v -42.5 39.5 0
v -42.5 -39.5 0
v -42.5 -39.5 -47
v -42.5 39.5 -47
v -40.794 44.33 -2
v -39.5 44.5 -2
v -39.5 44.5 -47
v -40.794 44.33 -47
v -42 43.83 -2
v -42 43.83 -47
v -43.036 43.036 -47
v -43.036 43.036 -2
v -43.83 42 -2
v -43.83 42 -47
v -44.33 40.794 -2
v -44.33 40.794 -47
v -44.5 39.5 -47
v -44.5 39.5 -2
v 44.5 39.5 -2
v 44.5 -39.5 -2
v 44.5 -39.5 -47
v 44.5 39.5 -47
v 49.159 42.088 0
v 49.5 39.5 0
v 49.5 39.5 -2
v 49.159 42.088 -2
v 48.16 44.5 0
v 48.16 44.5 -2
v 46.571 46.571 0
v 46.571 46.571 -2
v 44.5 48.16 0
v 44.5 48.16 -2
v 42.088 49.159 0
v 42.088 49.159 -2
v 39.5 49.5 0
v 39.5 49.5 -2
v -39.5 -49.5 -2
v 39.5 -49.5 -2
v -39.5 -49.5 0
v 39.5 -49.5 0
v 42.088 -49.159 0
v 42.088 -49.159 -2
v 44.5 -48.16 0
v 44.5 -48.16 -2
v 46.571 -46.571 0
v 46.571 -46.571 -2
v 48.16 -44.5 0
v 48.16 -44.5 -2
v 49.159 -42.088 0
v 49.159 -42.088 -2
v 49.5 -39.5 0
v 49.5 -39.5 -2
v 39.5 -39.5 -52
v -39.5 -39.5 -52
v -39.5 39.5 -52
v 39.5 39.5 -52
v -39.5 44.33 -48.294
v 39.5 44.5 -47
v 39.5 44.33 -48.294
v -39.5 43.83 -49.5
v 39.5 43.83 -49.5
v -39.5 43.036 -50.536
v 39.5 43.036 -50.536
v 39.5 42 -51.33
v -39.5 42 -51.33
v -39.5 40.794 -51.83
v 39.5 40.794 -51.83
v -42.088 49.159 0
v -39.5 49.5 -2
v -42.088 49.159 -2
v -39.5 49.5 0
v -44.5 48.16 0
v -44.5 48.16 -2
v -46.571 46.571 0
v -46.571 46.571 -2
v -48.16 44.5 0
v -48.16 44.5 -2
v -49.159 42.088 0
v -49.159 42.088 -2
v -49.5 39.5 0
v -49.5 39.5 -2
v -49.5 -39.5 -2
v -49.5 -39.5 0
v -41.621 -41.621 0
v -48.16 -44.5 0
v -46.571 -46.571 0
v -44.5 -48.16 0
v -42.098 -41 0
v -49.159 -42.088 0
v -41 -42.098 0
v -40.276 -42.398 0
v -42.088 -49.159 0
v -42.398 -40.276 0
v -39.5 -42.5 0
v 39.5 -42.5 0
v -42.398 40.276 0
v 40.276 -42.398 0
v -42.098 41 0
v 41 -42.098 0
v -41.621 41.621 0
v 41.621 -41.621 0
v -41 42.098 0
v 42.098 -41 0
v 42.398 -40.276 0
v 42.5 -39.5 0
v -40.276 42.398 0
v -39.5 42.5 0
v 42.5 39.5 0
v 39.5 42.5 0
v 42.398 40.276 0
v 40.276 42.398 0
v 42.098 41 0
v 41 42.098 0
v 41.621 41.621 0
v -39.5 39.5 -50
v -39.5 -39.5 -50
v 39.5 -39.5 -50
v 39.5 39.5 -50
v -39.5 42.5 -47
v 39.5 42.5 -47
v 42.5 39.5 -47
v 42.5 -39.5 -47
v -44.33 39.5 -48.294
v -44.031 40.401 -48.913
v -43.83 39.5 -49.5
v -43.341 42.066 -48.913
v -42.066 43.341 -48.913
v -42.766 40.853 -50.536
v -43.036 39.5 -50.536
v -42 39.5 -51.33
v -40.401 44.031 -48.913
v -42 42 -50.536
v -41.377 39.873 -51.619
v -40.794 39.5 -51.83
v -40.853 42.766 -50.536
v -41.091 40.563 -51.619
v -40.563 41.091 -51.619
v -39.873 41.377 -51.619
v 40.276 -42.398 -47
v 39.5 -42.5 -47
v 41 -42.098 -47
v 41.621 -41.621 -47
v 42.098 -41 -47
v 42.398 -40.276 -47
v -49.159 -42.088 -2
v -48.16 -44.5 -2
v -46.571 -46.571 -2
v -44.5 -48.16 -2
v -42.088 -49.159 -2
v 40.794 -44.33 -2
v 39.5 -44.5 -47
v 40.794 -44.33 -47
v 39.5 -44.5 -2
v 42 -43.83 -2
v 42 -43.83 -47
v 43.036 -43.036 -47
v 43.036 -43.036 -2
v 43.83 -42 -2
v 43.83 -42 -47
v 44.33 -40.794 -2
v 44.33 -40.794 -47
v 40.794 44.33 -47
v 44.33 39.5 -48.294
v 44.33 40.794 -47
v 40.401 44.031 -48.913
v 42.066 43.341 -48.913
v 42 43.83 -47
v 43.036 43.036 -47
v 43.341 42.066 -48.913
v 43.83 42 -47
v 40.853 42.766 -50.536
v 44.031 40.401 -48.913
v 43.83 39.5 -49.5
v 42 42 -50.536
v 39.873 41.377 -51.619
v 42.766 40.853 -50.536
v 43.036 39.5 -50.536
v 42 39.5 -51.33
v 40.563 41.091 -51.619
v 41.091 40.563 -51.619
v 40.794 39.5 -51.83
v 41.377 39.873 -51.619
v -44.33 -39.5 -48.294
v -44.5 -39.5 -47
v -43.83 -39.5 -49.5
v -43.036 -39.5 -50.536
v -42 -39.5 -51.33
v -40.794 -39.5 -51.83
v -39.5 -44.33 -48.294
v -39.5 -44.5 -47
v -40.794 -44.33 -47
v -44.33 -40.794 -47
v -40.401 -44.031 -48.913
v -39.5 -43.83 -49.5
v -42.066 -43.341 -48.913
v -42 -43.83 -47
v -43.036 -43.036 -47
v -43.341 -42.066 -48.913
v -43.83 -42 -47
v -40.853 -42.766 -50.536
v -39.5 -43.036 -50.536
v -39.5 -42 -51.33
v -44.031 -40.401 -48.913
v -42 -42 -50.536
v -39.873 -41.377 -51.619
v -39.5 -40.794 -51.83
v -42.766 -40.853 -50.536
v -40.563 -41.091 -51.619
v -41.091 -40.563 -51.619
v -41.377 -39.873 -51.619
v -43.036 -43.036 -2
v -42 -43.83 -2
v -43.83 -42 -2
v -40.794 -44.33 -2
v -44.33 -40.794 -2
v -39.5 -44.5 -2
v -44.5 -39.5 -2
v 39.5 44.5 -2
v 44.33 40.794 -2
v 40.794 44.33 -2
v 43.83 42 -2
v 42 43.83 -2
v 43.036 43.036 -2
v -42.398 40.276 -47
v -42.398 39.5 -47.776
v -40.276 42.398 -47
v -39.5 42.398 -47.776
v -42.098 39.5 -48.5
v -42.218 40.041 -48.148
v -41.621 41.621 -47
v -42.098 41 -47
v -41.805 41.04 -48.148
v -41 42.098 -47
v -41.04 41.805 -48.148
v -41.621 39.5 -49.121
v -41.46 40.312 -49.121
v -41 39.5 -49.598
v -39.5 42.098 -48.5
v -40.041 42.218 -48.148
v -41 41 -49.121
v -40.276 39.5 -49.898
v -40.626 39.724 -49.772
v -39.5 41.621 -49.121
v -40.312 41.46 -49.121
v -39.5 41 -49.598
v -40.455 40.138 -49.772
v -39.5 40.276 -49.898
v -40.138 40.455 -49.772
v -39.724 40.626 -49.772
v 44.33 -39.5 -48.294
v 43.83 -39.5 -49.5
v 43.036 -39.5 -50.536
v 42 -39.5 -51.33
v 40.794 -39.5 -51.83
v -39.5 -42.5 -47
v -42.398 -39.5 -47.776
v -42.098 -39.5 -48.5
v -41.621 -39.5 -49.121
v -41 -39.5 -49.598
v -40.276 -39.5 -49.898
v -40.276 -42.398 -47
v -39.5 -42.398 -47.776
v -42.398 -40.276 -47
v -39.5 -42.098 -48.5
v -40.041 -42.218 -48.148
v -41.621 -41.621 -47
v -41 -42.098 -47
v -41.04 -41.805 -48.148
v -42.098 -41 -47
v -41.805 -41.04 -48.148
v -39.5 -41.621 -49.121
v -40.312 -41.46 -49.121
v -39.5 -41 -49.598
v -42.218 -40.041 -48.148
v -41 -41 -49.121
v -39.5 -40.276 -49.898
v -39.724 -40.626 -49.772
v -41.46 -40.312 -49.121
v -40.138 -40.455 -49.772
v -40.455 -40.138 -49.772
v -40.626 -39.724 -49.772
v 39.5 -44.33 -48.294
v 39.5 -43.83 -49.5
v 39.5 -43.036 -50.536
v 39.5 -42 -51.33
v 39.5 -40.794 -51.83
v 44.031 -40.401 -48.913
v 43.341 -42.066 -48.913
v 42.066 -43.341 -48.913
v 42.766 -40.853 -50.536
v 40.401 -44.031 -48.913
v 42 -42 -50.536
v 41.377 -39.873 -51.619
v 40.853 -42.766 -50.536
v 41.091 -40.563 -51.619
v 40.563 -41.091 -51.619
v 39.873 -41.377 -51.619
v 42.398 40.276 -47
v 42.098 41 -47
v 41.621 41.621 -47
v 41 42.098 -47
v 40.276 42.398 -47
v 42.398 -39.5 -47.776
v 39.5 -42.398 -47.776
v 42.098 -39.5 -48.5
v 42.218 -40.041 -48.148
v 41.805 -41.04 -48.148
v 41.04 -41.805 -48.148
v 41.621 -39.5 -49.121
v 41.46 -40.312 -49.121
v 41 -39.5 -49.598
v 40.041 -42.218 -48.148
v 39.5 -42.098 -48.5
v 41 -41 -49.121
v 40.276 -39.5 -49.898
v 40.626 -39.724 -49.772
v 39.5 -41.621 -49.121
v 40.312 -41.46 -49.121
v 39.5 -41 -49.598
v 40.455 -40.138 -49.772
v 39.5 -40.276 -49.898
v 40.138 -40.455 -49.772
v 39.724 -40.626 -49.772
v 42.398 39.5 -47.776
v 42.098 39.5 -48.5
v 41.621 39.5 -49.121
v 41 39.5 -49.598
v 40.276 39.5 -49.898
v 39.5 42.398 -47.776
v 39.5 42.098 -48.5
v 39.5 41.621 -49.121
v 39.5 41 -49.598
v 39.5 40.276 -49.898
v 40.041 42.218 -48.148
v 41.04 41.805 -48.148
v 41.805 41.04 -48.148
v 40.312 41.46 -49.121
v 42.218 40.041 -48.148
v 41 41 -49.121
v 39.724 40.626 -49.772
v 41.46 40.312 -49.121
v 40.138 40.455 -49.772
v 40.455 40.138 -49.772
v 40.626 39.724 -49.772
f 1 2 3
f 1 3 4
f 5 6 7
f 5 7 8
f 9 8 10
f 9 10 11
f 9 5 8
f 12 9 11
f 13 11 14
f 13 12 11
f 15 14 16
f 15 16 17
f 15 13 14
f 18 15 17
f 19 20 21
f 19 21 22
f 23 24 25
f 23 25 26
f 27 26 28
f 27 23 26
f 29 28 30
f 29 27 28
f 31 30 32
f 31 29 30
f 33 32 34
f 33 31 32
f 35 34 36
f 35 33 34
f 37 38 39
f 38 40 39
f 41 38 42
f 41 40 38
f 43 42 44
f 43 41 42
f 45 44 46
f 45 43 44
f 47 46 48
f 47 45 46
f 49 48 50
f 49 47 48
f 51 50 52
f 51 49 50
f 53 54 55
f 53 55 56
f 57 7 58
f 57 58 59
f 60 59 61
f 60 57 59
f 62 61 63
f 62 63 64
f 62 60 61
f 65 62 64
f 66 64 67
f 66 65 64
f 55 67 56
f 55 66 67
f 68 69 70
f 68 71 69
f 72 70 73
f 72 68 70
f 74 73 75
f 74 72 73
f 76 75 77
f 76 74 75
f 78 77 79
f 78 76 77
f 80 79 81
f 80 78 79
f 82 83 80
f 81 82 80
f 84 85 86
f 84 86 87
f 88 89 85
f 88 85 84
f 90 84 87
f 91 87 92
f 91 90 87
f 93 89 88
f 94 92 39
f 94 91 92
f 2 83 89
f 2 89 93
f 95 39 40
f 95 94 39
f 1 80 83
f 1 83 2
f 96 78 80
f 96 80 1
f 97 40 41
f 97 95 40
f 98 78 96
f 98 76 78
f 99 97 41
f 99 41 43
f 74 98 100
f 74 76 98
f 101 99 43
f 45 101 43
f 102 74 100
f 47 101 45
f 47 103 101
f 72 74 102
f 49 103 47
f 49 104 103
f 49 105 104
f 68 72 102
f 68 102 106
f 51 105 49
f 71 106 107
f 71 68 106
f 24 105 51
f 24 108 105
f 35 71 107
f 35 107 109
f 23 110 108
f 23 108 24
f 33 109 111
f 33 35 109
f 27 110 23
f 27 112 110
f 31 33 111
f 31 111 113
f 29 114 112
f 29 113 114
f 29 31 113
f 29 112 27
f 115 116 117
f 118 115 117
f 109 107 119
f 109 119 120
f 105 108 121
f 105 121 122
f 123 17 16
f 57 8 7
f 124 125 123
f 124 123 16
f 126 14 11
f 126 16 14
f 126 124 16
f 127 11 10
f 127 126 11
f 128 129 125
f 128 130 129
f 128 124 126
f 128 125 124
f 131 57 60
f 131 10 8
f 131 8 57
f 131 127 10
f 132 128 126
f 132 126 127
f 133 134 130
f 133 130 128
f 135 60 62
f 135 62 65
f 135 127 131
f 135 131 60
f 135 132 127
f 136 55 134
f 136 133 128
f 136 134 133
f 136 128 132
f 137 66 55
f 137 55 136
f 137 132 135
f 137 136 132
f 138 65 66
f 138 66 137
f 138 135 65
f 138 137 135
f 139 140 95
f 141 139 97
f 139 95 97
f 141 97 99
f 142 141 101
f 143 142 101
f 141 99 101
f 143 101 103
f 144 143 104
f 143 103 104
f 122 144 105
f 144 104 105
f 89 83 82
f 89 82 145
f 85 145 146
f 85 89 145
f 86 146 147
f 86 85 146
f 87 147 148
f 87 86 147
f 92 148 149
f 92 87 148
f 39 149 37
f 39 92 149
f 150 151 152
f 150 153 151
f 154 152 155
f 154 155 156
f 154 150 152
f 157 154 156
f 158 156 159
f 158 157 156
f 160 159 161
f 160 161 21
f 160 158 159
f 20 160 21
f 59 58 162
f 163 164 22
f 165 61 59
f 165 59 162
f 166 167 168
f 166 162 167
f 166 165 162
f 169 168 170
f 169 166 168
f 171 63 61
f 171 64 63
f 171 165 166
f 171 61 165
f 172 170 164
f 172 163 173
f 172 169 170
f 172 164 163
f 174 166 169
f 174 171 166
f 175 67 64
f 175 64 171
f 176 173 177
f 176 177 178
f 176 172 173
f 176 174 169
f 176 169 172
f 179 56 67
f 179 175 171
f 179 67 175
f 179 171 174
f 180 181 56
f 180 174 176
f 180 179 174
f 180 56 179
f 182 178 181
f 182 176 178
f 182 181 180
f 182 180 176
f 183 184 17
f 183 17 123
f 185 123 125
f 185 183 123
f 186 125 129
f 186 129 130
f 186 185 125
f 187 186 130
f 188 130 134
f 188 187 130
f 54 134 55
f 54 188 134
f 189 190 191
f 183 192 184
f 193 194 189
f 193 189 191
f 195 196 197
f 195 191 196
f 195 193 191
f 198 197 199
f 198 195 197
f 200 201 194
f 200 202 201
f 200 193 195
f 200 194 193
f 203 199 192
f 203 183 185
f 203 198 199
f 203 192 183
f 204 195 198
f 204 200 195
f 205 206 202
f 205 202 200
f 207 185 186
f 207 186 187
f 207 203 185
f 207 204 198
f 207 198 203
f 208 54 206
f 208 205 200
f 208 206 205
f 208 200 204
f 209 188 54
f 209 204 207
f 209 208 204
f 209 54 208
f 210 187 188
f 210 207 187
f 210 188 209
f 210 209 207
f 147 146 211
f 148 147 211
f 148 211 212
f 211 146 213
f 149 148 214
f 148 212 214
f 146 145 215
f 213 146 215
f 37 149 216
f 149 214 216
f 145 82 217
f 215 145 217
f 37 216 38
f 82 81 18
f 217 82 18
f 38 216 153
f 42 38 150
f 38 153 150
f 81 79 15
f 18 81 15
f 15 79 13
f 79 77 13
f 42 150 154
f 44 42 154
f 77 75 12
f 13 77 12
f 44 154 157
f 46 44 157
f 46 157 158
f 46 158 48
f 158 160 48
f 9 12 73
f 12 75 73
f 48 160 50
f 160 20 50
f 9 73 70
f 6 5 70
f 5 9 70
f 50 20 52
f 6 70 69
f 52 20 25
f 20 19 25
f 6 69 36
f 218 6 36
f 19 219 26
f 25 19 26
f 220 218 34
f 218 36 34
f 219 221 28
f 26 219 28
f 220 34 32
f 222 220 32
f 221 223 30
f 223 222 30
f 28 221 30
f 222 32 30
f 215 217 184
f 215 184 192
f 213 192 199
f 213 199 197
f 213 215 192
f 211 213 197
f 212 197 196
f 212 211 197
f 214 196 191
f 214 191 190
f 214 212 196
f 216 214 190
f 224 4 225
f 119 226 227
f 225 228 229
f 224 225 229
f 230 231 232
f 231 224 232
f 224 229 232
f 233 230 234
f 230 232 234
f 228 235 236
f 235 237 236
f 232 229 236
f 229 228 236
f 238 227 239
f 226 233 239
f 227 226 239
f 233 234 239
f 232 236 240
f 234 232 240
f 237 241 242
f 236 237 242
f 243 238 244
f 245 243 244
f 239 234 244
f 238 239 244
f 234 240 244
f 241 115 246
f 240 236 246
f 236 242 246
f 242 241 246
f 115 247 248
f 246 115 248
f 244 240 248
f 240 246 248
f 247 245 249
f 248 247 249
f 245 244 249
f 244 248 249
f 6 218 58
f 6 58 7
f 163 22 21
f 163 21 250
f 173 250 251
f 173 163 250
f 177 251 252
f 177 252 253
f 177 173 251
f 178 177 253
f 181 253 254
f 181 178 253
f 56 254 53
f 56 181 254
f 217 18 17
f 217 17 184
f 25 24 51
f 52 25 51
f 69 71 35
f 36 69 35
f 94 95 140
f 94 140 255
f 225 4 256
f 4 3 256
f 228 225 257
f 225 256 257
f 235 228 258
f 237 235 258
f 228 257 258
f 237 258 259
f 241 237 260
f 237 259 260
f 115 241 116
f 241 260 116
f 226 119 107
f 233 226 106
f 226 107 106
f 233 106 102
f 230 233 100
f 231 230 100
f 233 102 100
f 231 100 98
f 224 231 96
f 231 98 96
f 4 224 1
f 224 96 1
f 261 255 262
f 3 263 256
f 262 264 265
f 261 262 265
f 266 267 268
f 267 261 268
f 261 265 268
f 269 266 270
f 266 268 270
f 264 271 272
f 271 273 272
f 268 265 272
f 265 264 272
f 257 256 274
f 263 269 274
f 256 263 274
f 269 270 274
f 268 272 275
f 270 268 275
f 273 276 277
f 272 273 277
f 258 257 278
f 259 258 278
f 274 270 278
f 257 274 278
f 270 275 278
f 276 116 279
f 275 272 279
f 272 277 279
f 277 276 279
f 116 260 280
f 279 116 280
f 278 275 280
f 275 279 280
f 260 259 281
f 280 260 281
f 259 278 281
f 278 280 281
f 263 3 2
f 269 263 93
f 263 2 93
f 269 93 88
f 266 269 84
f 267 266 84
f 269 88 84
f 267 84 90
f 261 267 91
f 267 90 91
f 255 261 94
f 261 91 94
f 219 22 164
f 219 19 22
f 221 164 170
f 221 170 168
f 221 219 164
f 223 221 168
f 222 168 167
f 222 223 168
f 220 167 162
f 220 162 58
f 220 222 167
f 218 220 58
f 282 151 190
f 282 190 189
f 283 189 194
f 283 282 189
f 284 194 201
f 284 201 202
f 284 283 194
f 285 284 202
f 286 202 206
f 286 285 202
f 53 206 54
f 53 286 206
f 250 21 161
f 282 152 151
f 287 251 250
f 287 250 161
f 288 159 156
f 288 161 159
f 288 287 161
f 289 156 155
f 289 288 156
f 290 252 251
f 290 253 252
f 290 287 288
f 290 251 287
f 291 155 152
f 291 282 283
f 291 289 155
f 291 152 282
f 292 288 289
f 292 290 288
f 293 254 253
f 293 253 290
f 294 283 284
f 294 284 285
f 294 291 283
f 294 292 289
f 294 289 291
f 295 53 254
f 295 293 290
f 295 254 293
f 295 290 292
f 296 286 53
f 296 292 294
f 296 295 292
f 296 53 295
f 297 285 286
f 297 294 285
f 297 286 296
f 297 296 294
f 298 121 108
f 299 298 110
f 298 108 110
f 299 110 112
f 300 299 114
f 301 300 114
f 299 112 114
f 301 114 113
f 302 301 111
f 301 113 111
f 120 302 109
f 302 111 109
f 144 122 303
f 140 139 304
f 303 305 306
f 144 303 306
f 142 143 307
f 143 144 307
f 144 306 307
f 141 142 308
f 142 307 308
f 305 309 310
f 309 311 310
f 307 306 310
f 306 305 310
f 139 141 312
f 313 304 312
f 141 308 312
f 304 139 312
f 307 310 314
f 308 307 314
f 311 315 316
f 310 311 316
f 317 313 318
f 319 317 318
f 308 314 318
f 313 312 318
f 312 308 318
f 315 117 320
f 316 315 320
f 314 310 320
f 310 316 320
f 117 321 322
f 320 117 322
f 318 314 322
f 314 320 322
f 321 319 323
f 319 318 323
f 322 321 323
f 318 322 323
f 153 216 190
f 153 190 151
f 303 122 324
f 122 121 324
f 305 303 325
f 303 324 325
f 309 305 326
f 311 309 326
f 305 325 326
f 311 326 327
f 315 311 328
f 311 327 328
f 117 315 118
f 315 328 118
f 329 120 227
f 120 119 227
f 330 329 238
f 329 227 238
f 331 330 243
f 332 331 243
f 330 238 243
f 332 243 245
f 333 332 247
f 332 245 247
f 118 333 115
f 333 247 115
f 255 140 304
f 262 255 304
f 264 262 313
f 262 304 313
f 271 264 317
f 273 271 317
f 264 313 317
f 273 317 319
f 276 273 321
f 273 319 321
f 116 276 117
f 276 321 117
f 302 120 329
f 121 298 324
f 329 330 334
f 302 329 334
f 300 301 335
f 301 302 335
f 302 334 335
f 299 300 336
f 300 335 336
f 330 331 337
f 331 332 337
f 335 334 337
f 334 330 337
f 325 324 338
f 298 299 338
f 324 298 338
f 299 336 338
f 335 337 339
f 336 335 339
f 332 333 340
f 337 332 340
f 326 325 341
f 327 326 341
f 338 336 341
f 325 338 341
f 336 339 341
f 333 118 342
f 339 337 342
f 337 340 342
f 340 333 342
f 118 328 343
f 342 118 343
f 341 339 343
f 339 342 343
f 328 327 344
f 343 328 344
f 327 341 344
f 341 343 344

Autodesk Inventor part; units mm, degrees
ref_plane "YZ Plane" through (0, 0, 0) normal (1, 0, 0) x (0, 1, 0)
ref_plane "XZ Plane" through (0, 0, 0) normal (0, 1, 0) x (-1, 0, 0)
ref_plane "XY Plane" through (0, 0, 0) normal (0, 0, 1) x (1, 0, 0)
sketch "Sketch1" plane through (0, 0, 0) normal (0, 0, 1) x (1, 0, 0)
  line L0 (-39.5, -44.5) -> (39.5, -44.5)
  line L1 (44.5, -39.5) -> (44.5, 39.5)
  line L2 (39.5, 44.5) -> (-39.5, 44.5)
  line L3 (-44.5, 39.5) -> (-44.5, -39.5)
  line L4 (-44.5, -44.5) -> (44.5, 44.5) construction
  line L5 (44.5, -44.5) -> (-44.5, 44.5) construction
  arc A0 (-39.5, 44.5) -> (-44.5, 39.5) centre (-39.5, 39.5) ccw
  arc A1 (44.5, 39.5) -> (39.5, 44.5) centre (39.5, 39.5) ccw
  arc A2 (39.5, -44.5) -> (44.5, -39.5) centre (39.5, -39.5) ccw
  arc A3 (-44.5, -39.5) -> (-39.5, -44.5) centre (-39.5, -39.5) ccw
  line L6 (-39.5, 42.5) -> (39.5, 42.5)
  arc A4 (42.5, 39.5) -> (39.5, 42.5) centre (39.5, 39.5) ccw
  line L7 (42.5, 39.5) -> (42.5, -39.5)
  arc A5 (39.5, -42.5) -> (42.5, -39.5) centre (39.5, -39.5) ccw
  line L8 (39.5, -42.5) -> (-39.5, -42.5)
  arc A6 (-42.5, -39.5) -> (-39.5, -42.5) centre (-39.5, -39.5) ccw
  line L9 (-42.5, -39.5) -> (-42.5, 39.5)
  arc A7 (-39.5, 42.5) -> (-42.5, 39.5) centre (-39.5, 39.5) ccw
  line L10 (-49.5, -39.5) -> (-49.5, 39.5)
  arc A8 (-39.5, 49.5) -> (-49.5, 39.5) centre (-39.5, 39.5) ccw
  line L11 (-39.5, 49.5) -> (39.5, 49.5)
  arc A9 (49.5, 39.5) -> (39.5, 49.5) centre (39.5, 39.5) ccw
  line L12 (49.5, 39.5) -> (49.5, -39.5)
  arc A10 (39.5, -49.5) -> (49.5, -39.5) centre (39.5, -39.5) ccw
  line L13 (39.5, -49.5) -> (-39.5, -49.5)
  arc A11 (-49.5, -39.5) -> (-39.5, -49.5) centre (-39.5, -39.5) ccw
  point P0 (0, 0)
  dimension "d0" = 89
  dimension "d1" = 89
  dimension "d2" = 5
  dimension "d3" = 2
  dimension "d4" = 5
extrude "Extrusion1" add sketch "Sketch1" against normal blind 52 contours A3 L3 A0 L2 A1 L1 A2 L0 | L6 A4 L7 A5 L8 A6 L9 A7
extrude "Extrusion2" cut sketch "Sketch1" against normal blind 50 contours L6 A4 L7 A5 L8 A6 L9 A7
extrude "Extrusion3" add sketch "Sketch1" against normal blind 2 contours L10 A8 L11 A9 L12 A10 L13 A11
fillet "Fillet1" radius 5 8 edges at (43.0355, 43.0355, -52) (44.5, 0, -52) (43.0355, -43.0355, -52) (0, -44.5, -52) (-43.0355, -43.0355, -52) (-44.5, 0, -52) (-43.0355, 43.0355, -52) (0, 44.5, -52)
fillet "Fillet2" radius 3 8 edges at (-41.6213, -41.6213, -50) (-42.5, 0, -50) (-41.6213, 41.6213, -50) (0, 42.5, -50) (41.6213, 41.6213, -50) (42.5, 0, -50) (41.6213, -41.6213, -50) (0, -42.5, -50)
properties part number "base" material "ABS Plastic"
